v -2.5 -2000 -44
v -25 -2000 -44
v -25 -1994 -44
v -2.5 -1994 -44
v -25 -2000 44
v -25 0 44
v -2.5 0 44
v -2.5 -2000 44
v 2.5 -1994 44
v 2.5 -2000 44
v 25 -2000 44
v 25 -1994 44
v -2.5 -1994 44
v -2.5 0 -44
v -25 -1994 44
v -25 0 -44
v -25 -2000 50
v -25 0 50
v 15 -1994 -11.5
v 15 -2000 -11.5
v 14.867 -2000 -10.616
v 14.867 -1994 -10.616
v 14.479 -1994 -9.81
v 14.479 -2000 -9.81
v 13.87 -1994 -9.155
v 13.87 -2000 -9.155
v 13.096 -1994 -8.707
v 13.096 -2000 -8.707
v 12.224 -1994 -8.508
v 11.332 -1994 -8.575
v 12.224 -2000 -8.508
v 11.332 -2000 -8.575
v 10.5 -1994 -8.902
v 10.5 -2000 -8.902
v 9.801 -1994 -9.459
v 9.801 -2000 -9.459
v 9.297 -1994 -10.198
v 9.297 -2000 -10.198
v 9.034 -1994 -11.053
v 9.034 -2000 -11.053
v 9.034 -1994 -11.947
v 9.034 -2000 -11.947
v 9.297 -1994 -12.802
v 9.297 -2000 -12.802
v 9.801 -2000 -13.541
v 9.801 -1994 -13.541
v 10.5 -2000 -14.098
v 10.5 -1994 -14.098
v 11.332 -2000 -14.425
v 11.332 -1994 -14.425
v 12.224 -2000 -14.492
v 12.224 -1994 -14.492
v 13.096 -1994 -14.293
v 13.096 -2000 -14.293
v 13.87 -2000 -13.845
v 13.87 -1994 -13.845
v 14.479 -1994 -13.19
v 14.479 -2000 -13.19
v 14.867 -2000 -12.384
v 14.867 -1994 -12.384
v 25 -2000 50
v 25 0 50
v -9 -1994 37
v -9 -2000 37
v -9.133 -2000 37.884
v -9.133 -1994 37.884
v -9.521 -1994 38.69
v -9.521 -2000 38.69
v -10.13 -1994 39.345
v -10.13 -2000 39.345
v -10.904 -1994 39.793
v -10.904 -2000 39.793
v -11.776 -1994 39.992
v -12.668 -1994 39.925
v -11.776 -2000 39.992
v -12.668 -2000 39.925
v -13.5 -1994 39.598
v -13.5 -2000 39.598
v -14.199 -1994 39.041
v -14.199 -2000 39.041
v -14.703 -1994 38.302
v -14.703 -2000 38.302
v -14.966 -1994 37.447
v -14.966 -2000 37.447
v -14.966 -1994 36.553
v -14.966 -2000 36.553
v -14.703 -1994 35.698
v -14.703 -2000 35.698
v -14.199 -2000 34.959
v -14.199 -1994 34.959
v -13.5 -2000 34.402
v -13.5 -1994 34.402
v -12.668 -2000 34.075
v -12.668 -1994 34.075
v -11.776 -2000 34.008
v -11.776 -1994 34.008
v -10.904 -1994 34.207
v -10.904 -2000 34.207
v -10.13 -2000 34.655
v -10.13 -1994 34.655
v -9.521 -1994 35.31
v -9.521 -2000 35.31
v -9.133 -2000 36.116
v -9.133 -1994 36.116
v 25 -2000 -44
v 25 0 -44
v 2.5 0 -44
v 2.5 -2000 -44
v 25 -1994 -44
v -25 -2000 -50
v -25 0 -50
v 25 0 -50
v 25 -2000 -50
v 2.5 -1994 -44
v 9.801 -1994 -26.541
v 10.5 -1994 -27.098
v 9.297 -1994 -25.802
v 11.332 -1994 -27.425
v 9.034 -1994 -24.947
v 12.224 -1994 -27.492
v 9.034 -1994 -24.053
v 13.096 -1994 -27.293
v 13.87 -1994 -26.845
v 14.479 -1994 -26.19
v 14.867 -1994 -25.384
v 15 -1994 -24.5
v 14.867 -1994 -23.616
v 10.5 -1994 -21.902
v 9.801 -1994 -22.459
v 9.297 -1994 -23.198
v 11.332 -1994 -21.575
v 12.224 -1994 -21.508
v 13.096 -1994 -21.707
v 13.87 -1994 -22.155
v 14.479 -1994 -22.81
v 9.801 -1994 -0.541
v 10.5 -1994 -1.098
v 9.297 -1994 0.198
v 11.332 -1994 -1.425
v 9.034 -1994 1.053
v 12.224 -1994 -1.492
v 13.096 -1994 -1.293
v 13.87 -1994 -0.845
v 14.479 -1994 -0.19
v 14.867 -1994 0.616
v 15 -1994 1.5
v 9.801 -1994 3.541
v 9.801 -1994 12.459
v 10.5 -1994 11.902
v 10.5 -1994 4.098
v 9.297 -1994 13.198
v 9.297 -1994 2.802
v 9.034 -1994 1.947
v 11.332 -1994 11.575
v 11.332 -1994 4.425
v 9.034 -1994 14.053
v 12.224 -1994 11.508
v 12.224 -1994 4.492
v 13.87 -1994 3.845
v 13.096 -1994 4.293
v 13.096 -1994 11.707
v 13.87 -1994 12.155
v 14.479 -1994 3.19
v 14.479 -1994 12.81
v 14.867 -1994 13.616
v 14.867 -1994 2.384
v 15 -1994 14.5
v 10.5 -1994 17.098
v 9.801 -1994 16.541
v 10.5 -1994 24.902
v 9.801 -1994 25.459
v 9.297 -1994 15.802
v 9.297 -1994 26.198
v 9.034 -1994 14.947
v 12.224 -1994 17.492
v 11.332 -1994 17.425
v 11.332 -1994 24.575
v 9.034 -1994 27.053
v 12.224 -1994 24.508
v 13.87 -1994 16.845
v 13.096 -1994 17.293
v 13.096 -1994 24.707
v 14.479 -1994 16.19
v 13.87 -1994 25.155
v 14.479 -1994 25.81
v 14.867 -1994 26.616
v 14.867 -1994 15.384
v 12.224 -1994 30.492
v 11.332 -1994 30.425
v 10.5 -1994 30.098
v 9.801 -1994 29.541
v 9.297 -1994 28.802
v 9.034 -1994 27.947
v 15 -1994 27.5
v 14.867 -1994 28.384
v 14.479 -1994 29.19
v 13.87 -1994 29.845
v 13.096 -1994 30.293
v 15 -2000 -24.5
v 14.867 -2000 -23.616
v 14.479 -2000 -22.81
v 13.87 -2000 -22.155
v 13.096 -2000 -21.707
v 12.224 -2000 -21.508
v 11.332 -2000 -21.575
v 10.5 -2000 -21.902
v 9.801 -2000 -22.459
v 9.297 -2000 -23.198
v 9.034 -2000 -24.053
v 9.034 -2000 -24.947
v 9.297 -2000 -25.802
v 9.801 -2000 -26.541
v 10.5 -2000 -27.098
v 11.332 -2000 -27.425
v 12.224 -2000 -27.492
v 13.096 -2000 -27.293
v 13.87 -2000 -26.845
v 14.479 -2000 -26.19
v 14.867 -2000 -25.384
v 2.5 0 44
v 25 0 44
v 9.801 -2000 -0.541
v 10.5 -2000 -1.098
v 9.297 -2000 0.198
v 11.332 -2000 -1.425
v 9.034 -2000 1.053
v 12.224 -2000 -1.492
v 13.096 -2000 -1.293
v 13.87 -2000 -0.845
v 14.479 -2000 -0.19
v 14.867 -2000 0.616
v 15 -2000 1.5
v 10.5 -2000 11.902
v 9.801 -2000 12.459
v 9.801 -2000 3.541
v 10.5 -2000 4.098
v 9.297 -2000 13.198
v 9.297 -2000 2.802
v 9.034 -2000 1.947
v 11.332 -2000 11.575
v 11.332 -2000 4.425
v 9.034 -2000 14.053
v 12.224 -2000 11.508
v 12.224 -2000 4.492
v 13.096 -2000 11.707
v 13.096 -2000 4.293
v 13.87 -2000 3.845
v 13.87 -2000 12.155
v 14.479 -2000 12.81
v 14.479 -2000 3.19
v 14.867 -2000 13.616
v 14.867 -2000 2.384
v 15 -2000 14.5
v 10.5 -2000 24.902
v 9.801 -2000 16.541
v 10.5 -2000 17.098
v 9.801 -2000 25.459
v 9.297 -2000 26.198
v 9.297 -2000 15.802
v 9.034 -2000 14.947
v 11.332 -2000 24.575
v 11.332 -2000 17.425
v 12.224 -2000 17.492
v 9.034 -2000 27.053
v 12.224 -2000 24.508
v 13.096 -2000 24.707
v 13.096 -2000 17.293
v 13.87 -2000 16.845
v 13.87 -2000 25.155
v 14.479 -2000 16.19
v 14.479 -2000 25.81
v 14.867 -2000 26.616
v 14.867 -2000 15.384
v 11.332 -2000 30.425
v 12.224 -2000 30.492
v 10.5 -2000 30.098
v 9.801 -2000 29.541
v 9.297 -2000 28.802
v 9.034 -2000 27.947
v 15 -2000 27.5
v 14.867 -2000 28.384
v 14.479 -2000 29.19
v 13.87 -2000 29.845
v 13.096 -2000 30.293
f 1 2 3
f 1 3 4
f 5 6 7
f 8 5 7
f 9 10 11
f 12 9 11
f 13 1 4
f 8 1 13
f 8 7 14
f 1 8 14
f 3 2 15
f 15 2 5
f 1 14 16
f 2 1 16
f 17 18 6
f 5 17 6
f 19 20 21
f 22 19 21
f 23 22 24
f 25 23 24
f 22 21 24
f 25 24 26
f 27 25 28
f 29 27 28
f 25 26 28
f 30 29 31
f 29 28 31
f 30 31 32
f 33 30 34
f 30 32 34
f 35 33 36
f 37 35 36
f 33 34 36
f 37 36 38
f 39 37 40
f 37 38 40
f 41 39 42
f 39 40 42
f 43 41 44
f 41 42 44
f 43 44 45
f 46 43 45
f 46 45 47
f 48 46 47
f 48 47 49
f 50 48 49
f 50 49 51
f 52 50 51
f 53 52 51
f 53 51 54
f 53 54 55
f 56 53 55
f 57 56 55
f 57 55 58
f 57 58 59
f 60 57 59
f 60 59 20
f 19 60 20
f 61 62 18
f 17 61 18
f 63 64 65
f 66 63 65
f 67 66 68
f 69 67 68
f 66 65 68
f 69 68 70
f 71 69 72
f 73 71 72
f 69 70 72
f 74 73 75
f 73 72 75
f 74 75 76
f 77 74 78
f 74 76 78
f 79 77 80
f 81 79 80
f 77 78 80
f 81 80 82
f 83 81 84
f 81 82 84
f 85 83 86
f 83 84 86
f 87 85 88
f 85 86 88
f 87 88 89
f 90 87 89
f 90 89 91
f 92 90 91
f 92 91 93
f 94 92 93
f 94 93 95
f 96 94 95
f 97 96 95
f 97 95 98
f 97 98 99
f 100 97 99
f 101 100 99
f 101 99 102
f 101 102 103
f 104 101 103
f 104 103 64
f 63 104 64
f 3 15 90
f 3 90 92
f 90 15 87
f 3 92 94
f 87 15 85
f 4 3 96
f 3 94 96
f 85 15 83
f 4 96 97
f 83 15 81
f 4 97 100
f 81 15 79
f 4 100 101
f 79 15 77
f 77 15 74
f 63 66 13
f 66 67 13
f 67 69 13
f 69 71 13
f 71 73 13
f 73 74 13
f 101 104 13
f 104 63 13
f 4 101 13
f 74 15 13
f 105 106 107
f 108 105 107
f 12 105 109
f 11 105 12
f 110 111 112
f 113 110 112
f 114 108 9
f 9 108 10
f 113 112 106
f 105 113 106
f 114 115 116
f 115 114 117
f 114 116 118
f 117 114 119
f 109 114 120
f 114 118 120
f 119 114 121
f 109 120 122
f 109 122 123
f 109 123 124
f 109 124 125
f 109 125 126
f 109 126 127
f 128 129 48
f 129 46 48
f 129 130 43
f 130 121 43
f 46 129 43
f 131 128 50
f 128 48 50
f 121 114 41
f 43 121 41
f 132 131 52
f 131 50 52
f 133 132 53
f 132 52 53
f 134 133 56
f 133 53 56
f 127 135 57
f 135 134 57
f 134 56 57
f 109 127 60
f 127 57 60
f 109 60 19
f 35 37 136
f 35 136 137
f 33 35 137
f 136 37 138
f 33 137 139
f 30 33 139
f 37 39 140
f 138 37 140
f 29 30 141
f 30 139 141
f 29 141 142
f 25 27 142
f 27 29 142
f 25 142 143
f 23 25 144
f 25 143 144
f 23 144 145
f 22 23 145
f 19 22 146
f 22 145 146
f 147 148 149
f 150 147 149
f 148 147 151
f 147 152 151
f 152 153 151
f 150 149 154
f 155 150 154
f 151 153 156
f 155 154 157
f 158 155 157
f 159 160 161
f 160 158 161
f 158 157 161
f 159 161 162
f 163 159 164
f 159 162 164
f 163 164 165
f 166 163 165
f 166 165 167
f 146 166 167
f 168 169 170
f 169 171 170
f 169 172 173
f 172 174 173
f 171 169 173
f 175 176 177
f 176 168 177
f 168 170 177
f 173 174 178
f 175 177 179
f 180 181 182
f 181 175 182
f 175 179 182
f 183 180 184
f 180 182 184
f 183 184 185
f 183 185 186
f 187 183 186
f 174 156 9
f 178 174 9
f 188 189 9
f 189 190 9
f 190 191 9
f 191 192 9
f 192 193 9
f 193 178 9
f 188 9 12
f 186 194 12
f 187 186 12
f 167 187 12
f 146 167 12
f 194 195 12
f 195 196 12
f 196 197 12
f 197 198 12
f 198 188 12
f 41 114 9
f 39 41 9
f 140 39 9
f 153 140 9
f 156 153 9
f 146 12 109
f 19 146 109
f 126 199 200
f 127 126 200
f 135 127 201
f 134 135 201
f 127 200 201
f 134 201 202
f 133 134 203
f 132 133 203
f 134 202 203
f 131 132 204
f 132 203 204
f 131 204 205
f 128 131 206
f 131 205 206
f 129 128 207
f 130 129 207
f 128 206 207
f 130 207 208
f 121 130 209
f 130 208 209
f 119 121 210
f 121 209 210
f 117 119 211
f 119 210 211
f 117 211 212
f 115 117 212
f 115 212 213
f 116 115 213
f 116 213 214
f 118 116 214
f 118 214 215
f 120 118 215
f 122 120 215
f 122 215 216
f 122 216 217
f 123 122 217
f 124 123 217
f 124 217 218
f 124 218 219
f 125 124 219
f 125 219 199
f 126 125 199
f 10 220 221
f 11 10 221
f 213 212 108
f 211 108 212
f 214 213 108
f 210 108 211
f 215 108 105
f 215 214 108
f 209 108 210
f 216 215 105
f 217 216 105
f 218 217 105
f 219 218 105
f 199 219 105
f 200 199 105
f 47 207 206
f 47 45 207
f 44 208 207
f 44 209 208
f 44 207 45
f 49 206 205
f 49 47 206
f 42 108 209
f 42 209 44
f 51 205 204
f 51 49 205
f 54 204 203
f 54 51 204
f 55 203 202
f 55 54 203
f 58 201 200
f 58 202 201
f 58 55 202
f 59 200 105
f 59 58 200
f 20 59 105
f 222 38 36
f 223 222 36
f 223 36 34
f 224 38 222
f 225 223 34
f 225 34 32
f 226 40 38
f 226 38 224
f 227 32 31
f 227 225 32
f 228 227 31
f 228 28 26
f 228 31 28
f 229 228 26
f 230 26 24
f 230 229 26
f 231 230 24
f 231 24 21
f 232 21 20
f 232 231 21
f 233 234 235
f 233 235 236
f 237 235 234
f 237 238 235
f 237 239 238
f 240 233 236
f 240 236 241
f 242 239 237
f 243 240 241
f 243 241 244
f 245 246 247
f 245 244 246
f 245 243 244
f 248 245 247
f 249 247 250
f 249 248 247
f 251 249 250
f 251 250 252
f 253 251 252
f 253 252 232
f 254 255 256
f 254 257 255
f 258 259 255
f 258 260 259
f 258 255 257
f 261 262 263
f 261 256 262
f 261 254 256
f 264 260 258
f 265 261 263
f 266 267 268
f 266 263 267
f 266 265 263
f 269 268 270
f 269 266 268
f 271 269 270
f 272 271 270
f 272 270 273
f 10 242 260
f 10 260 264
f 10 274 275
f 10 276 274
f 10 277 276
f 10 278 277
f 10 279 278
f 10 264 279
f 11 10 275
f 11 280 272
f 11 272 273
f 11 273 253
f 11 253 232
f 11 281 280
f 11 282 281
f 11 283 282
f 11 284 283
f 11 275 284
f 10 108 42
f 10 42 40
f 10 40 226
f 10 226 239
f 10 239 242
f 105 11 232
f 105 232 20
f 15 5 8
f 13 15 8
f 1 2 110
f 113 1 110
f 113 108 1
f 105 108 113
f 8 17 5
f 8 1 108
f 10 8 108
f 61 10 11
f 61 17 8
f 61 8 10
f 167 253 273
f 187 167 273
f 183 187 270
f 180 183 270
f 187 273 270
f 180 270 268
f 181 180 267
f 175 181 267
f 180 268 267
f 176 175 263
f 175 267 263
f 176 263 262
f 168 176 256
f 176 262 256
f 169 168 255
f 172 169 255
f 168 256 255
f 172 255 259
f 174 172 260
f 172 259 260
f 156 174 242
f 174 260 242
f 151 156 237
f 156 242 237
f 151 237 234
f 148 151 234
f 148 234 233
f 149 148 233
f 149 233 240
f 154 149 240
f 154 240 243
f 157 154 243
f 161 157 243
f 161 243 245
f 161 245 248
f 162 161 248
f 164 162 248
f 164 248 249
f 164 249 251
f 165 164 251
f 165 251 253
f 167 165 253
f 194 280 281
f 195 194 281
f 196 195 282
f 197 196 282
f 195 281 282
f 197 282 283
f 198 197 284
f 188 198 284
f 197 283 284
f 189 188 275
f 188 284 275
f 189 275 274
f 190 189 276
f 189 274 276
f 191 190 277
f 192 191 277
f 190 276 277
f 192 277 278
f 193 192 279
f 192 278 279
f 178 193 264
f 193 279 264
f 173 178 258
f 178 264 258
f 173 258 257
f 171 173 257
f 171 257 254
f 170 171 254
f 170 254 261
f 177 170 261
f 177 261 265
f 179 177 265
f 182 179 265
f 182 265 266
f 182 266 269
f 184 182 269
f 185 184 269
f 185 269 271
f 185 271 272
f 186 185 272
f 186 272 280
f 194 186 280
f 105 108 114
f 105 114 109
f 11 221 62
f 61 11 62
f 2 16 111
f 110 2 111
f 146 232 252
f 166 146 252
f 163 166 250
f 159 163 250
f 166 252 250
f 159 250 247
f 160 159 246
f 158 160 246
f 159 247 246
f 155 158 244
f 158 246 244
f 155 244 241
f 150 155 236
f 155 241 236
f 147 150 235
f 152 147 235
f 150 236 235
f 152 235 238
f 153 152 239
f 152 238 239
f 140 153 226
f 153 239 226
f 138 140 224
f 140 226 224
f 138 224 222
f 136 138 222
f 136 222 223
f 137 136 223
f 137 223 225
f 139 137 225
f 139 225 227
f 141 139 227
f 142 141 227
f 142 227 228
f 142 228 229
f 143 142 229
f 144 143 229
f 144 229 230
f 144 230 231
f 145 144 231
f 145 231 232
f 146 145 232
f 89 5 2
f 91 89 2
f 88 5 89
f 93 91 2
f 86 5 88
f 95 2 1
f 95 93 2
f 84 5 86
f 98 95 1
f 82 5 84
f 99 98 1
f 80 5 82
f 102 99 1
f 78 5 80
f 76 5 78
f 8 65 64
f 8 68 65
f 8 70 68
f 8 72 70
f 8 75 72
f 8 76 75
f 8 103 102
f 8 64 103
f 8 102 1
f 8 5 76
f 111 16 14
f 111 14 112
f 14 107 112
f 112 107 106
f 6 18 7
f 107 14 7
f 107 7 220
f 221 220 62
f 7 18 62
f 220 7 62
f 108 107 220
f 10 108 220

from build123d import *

# Parameters (mm, degrees)
F1_DEPTH = 2000
F2_W     = 22.5
F2_H     = 88
F3_DEPTH = 6
F4_W     = 22.5
F4_H     = 88
F5_DEPTH = 6
F7_D     = 6
F9_D     = 6


with BuildPart() as f1:
    # F0 (on Front) → F1 (new body)
    with BuildSketch(Plane.XZ):
        Polygon((25, 44), (25, 50), (-25, 50), (-25, 44), (-2.5, 44), (-2.5, -44), (-25, -44), (-25, -50), (25, -50), (25, -44), (2.5, -44), (2.5, 44), align=None)
    extrude(amount=F1_DEPTH)


with BuildPart() as f3:
    # F2 (on face) → F3 (new body)
    with BuildSketch(Plane.XZ.offset(2000)):
        with Locations((-13.75, 0)):
            Rectangle(F2_W, F2_H)
    extrude(amount=-F3_DEPTH)

    # F9 (through all)
    with Locations(Plane(origin=(0, -1994, 0), x_dir=(-1, 0, 0), z_dir=(0, 1, 0))):
        with Locations((12, 37)):
            Hole(F9_D / 2)


with BuildPart() as f5:
    # F4 (on face) → F5 (new body)
    with BuildSketch(Plane.XZ.offset(2000)):
        with Locations((13.75, 0)):
            Rectangle(F4_W, F4_H)
    extrude(amount=-F5_DEPTH)

    # F7 (through all)
    with Locations(Plane(origin=(0, -1994, 0), x_dir=(-1, 0, 0), z_dir=(0, 1, 0))):
        with Locations((-12, 27.5), (-12, 14.5), (-12, 1.5), (-12, -11.5), (-12, -24.5)):
            Hole(F7_D / 2)


solid = Compound([f1.part, f3.part, f5.part])
